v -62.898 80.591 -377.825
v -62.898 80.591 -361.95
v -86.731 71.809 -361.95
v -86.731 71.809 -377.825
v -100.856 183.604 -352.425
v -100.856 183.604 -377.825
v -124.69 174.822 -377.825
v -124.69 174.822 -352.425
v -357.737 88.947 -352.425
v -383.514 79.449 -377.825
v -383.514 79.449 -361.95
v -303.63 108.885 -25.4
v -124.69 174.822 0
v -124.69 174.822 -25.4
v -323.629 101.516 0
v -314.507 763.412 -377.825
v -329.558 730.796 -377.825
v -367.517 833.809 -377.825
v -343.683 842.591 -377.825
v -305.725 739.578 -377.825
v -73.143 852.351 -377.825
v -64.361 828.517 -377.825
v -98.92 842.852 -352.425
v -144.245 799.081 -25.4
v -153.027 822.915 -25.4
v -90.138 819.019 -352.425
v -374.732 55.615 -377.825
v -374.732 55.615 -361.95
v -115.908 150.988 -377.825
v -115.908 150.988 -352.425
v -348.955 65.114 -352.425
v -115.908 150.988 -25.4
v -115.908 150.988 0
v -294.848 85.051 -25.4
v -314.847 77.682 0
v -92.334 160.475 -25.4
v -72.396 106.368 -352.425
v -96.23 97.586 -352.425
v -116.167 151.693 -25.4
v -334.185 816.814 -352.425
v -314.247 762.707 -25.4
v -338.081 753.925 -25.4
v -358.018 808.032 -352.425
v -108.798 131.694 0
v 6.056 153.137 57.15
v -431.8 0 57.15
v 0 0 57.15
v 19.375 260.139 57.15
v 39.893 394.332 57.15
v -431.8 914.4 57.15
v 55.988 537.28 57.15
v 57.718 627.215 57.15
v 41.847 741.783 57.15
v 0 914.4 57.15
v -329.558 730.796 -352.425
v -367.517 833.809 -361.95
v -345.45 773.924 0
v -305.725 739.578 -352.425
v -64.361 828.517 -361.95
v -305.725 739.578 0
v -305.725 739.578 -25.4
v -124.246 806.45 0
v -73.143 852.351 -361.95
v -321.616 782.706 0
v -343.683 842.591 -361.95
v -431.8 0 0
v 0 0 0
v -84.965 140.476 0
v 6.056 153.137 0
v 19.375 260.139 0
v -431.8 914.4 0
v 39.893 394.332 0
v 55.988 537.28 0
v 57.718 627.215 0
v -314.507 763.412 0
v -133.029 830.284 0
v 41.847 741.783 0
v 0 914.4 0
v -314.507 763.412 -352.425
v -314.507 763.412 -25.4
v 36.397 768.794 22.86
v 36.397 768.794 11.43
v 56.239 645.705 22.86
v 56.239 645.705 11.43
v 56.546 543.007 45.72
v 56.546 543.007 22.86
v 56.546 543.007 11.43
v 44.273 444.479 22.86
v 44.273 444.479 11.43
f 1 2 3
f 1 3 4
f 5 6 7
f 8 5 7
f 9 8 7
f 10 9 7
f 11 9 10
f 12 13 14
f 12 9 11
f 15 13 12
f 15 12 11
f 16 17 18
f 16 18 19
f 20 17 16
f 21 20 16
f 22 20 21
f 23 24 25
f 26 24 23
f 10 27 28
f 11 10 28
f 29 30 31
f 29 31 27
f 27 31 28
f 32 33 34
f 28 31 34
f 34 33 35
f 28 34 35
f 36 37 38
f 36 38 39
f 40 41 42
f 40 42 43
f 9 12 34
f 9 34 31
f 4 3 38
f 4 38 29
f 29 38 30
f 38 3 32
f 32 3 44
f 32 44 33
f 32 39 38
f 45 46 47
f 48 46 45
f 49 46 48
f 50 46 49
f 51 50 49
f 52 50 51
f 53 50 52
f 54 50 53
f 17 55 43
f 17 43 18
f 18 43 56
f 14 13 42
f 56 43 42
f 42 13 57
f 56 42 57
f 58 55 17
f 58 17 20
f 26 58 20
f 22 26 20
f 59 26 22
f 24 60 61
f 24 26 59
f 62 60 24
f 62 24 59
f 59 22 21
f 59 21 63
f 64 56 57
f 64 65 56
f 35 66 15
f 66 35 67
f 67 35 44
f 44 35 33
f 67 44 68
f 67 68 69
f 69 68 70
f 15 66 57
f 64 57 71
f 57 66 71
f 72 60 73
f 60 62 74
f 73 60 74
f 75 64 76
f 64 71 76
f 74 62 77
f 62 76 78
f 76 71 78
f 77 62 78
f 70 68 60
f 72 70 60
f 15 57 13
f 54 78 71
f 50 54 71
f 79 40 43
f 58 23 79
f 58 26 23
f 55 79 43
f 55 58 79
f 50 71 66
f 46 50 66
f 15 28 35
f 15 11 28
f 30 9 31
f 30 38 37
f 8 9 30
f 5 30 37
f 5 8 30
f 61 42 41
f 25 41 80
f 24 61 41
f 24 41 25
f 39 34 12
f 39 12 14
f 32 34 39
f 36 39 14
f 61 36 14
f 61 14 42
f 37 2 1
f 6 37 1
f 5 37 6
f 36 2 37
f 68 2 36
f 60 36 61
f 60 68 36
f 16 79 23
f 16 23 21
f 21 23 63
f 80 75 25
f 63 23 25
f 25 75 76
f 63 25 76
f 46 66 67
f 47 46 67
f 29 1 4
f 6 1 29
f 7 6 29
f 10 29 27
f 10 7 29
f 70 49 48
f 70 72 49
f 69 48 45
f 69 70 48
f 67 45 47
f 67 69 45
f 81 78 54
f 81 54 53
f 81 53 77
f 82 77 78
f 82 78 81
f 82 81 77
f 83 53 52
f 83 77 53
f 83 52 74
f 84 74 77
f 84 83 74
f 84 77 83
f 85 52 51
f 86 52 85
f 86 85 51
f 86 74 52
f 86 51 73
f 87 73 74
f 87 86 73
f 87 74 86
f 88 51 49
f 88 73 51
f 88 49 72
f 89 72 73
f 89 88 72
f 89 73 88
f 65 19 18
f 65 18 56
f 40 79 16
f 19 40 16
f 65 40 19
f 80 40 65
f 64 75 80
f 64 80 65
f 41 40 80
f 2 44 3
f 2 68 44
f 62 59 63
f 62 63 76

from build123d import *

# Parameters (mm, degrees)
F1_DEPTH  = 57.15
F7_DEPTH  = 12.7
F10_DEPTH = 12.7
F13_DEPTH = 12.7


with BuildPart() as f1:
    # F0 (on Top) → F1 (new body)
    with BuildSketch(Plane.XY):
        with BuildLine():
            Line((-431.8, 0), (0, 0))
            add(Edge.make_bspline(
                [(0, 914.4), (23.5507032827, 831.9263504284), (55.2787257206, 692.1124240056), (62.6142503733, 561.2826910152), (41.6707497482, 443.3728550075), (38.5300420658, 330.7716155659), (0, 195.428914411), (0, 0)],
                knots=[0, 0, 0, 0, 0.2320365414, 0.4049787378, 0.5671641169, 0.7147476654, 1, 1, 1, 1], degree=3))
            Line((0, 914.4), (-431.8, 914.4))
            Line((-431.8, 914.4), (-431.8, 0))
        make_face()
    extrude(amount=F1_DEPTH)

    # F6 (on 3pt) → F7 (join, symmetric)
    with BuildSketch(Plane(origin=(-41.1487974849, -15.1627071845, 0), x_dir=(-0.3457580408, 0.938323706, 0), z_dir=(0.938323706, 0.3457580408, 0))):
        Polygon((161.1895555469, 0), (97.3680048795, -361.95), (97.3680048795, -377.825), (207.1518256944, -377.825), (207.1518256944, -352.425), (124.8393553126, -352.425), (182.5026861788, -25.4), (503.4112472735, -25.4), (503.4112472735, 0), align=None)
        Polygon((845.632939, 0), (503.4112472735, 0), (503.4112472735, -25.4), (824.3198083682, -25.4), (881.9831392344, -352.425), (799.6706688525, -352.425), (799.6706688525, -377.825), (909.4544896675, -377.825), (909.4544896675, -361.95), align=None)
    extrude(amount=F7_DEPTH, both=True)

    # F9 (on plane+point) → F10 (join, symmetric)
    with BuildSketch(Plane(origin=(-67.2332822759, 182.4587577243, 0), x_dir=(-0.938323706, -0.3457580408, 0), z_dir=(-0.3457580408, 0.938323706, 0))):
        Polygon((268.5687023797, 0), (56.5535200824, 0), (56.5535200824, -25.4), (247.2555717478, -25.4), (304.918902614, -352.425), (56.5535200824, -352.425), (56.5535200824, -377.825), (332.3902530472, -377.825), (332.3902530472, -361.95), align=None)
    extrude(amount=F10_DEPTH, both=True)

    # F12 (on offset) → F13 (join, symmetric)
    with BuildSketch(Plane(origin=(-280.8836908399, 762.2666566446, 0), x_dir=(0.938323706, 0.3457580408, 0), z_dir=(0.3457580408, -0.938323706, 0))):
        Polygon((-31.1535200824, -352.425), (-31.1535200824, -377.825), (226.0748147964, -377.825), (226.0748147964, -361.95), (162.253264129, 0), (-31.1535200824, 0), (-31.1535200824, -25.4), (140.9401334971, -25.4), (198.6034643633, -352.425), align=None)
    extrude(amount=F13_DEPTH, both=True)


solid = f1.part
